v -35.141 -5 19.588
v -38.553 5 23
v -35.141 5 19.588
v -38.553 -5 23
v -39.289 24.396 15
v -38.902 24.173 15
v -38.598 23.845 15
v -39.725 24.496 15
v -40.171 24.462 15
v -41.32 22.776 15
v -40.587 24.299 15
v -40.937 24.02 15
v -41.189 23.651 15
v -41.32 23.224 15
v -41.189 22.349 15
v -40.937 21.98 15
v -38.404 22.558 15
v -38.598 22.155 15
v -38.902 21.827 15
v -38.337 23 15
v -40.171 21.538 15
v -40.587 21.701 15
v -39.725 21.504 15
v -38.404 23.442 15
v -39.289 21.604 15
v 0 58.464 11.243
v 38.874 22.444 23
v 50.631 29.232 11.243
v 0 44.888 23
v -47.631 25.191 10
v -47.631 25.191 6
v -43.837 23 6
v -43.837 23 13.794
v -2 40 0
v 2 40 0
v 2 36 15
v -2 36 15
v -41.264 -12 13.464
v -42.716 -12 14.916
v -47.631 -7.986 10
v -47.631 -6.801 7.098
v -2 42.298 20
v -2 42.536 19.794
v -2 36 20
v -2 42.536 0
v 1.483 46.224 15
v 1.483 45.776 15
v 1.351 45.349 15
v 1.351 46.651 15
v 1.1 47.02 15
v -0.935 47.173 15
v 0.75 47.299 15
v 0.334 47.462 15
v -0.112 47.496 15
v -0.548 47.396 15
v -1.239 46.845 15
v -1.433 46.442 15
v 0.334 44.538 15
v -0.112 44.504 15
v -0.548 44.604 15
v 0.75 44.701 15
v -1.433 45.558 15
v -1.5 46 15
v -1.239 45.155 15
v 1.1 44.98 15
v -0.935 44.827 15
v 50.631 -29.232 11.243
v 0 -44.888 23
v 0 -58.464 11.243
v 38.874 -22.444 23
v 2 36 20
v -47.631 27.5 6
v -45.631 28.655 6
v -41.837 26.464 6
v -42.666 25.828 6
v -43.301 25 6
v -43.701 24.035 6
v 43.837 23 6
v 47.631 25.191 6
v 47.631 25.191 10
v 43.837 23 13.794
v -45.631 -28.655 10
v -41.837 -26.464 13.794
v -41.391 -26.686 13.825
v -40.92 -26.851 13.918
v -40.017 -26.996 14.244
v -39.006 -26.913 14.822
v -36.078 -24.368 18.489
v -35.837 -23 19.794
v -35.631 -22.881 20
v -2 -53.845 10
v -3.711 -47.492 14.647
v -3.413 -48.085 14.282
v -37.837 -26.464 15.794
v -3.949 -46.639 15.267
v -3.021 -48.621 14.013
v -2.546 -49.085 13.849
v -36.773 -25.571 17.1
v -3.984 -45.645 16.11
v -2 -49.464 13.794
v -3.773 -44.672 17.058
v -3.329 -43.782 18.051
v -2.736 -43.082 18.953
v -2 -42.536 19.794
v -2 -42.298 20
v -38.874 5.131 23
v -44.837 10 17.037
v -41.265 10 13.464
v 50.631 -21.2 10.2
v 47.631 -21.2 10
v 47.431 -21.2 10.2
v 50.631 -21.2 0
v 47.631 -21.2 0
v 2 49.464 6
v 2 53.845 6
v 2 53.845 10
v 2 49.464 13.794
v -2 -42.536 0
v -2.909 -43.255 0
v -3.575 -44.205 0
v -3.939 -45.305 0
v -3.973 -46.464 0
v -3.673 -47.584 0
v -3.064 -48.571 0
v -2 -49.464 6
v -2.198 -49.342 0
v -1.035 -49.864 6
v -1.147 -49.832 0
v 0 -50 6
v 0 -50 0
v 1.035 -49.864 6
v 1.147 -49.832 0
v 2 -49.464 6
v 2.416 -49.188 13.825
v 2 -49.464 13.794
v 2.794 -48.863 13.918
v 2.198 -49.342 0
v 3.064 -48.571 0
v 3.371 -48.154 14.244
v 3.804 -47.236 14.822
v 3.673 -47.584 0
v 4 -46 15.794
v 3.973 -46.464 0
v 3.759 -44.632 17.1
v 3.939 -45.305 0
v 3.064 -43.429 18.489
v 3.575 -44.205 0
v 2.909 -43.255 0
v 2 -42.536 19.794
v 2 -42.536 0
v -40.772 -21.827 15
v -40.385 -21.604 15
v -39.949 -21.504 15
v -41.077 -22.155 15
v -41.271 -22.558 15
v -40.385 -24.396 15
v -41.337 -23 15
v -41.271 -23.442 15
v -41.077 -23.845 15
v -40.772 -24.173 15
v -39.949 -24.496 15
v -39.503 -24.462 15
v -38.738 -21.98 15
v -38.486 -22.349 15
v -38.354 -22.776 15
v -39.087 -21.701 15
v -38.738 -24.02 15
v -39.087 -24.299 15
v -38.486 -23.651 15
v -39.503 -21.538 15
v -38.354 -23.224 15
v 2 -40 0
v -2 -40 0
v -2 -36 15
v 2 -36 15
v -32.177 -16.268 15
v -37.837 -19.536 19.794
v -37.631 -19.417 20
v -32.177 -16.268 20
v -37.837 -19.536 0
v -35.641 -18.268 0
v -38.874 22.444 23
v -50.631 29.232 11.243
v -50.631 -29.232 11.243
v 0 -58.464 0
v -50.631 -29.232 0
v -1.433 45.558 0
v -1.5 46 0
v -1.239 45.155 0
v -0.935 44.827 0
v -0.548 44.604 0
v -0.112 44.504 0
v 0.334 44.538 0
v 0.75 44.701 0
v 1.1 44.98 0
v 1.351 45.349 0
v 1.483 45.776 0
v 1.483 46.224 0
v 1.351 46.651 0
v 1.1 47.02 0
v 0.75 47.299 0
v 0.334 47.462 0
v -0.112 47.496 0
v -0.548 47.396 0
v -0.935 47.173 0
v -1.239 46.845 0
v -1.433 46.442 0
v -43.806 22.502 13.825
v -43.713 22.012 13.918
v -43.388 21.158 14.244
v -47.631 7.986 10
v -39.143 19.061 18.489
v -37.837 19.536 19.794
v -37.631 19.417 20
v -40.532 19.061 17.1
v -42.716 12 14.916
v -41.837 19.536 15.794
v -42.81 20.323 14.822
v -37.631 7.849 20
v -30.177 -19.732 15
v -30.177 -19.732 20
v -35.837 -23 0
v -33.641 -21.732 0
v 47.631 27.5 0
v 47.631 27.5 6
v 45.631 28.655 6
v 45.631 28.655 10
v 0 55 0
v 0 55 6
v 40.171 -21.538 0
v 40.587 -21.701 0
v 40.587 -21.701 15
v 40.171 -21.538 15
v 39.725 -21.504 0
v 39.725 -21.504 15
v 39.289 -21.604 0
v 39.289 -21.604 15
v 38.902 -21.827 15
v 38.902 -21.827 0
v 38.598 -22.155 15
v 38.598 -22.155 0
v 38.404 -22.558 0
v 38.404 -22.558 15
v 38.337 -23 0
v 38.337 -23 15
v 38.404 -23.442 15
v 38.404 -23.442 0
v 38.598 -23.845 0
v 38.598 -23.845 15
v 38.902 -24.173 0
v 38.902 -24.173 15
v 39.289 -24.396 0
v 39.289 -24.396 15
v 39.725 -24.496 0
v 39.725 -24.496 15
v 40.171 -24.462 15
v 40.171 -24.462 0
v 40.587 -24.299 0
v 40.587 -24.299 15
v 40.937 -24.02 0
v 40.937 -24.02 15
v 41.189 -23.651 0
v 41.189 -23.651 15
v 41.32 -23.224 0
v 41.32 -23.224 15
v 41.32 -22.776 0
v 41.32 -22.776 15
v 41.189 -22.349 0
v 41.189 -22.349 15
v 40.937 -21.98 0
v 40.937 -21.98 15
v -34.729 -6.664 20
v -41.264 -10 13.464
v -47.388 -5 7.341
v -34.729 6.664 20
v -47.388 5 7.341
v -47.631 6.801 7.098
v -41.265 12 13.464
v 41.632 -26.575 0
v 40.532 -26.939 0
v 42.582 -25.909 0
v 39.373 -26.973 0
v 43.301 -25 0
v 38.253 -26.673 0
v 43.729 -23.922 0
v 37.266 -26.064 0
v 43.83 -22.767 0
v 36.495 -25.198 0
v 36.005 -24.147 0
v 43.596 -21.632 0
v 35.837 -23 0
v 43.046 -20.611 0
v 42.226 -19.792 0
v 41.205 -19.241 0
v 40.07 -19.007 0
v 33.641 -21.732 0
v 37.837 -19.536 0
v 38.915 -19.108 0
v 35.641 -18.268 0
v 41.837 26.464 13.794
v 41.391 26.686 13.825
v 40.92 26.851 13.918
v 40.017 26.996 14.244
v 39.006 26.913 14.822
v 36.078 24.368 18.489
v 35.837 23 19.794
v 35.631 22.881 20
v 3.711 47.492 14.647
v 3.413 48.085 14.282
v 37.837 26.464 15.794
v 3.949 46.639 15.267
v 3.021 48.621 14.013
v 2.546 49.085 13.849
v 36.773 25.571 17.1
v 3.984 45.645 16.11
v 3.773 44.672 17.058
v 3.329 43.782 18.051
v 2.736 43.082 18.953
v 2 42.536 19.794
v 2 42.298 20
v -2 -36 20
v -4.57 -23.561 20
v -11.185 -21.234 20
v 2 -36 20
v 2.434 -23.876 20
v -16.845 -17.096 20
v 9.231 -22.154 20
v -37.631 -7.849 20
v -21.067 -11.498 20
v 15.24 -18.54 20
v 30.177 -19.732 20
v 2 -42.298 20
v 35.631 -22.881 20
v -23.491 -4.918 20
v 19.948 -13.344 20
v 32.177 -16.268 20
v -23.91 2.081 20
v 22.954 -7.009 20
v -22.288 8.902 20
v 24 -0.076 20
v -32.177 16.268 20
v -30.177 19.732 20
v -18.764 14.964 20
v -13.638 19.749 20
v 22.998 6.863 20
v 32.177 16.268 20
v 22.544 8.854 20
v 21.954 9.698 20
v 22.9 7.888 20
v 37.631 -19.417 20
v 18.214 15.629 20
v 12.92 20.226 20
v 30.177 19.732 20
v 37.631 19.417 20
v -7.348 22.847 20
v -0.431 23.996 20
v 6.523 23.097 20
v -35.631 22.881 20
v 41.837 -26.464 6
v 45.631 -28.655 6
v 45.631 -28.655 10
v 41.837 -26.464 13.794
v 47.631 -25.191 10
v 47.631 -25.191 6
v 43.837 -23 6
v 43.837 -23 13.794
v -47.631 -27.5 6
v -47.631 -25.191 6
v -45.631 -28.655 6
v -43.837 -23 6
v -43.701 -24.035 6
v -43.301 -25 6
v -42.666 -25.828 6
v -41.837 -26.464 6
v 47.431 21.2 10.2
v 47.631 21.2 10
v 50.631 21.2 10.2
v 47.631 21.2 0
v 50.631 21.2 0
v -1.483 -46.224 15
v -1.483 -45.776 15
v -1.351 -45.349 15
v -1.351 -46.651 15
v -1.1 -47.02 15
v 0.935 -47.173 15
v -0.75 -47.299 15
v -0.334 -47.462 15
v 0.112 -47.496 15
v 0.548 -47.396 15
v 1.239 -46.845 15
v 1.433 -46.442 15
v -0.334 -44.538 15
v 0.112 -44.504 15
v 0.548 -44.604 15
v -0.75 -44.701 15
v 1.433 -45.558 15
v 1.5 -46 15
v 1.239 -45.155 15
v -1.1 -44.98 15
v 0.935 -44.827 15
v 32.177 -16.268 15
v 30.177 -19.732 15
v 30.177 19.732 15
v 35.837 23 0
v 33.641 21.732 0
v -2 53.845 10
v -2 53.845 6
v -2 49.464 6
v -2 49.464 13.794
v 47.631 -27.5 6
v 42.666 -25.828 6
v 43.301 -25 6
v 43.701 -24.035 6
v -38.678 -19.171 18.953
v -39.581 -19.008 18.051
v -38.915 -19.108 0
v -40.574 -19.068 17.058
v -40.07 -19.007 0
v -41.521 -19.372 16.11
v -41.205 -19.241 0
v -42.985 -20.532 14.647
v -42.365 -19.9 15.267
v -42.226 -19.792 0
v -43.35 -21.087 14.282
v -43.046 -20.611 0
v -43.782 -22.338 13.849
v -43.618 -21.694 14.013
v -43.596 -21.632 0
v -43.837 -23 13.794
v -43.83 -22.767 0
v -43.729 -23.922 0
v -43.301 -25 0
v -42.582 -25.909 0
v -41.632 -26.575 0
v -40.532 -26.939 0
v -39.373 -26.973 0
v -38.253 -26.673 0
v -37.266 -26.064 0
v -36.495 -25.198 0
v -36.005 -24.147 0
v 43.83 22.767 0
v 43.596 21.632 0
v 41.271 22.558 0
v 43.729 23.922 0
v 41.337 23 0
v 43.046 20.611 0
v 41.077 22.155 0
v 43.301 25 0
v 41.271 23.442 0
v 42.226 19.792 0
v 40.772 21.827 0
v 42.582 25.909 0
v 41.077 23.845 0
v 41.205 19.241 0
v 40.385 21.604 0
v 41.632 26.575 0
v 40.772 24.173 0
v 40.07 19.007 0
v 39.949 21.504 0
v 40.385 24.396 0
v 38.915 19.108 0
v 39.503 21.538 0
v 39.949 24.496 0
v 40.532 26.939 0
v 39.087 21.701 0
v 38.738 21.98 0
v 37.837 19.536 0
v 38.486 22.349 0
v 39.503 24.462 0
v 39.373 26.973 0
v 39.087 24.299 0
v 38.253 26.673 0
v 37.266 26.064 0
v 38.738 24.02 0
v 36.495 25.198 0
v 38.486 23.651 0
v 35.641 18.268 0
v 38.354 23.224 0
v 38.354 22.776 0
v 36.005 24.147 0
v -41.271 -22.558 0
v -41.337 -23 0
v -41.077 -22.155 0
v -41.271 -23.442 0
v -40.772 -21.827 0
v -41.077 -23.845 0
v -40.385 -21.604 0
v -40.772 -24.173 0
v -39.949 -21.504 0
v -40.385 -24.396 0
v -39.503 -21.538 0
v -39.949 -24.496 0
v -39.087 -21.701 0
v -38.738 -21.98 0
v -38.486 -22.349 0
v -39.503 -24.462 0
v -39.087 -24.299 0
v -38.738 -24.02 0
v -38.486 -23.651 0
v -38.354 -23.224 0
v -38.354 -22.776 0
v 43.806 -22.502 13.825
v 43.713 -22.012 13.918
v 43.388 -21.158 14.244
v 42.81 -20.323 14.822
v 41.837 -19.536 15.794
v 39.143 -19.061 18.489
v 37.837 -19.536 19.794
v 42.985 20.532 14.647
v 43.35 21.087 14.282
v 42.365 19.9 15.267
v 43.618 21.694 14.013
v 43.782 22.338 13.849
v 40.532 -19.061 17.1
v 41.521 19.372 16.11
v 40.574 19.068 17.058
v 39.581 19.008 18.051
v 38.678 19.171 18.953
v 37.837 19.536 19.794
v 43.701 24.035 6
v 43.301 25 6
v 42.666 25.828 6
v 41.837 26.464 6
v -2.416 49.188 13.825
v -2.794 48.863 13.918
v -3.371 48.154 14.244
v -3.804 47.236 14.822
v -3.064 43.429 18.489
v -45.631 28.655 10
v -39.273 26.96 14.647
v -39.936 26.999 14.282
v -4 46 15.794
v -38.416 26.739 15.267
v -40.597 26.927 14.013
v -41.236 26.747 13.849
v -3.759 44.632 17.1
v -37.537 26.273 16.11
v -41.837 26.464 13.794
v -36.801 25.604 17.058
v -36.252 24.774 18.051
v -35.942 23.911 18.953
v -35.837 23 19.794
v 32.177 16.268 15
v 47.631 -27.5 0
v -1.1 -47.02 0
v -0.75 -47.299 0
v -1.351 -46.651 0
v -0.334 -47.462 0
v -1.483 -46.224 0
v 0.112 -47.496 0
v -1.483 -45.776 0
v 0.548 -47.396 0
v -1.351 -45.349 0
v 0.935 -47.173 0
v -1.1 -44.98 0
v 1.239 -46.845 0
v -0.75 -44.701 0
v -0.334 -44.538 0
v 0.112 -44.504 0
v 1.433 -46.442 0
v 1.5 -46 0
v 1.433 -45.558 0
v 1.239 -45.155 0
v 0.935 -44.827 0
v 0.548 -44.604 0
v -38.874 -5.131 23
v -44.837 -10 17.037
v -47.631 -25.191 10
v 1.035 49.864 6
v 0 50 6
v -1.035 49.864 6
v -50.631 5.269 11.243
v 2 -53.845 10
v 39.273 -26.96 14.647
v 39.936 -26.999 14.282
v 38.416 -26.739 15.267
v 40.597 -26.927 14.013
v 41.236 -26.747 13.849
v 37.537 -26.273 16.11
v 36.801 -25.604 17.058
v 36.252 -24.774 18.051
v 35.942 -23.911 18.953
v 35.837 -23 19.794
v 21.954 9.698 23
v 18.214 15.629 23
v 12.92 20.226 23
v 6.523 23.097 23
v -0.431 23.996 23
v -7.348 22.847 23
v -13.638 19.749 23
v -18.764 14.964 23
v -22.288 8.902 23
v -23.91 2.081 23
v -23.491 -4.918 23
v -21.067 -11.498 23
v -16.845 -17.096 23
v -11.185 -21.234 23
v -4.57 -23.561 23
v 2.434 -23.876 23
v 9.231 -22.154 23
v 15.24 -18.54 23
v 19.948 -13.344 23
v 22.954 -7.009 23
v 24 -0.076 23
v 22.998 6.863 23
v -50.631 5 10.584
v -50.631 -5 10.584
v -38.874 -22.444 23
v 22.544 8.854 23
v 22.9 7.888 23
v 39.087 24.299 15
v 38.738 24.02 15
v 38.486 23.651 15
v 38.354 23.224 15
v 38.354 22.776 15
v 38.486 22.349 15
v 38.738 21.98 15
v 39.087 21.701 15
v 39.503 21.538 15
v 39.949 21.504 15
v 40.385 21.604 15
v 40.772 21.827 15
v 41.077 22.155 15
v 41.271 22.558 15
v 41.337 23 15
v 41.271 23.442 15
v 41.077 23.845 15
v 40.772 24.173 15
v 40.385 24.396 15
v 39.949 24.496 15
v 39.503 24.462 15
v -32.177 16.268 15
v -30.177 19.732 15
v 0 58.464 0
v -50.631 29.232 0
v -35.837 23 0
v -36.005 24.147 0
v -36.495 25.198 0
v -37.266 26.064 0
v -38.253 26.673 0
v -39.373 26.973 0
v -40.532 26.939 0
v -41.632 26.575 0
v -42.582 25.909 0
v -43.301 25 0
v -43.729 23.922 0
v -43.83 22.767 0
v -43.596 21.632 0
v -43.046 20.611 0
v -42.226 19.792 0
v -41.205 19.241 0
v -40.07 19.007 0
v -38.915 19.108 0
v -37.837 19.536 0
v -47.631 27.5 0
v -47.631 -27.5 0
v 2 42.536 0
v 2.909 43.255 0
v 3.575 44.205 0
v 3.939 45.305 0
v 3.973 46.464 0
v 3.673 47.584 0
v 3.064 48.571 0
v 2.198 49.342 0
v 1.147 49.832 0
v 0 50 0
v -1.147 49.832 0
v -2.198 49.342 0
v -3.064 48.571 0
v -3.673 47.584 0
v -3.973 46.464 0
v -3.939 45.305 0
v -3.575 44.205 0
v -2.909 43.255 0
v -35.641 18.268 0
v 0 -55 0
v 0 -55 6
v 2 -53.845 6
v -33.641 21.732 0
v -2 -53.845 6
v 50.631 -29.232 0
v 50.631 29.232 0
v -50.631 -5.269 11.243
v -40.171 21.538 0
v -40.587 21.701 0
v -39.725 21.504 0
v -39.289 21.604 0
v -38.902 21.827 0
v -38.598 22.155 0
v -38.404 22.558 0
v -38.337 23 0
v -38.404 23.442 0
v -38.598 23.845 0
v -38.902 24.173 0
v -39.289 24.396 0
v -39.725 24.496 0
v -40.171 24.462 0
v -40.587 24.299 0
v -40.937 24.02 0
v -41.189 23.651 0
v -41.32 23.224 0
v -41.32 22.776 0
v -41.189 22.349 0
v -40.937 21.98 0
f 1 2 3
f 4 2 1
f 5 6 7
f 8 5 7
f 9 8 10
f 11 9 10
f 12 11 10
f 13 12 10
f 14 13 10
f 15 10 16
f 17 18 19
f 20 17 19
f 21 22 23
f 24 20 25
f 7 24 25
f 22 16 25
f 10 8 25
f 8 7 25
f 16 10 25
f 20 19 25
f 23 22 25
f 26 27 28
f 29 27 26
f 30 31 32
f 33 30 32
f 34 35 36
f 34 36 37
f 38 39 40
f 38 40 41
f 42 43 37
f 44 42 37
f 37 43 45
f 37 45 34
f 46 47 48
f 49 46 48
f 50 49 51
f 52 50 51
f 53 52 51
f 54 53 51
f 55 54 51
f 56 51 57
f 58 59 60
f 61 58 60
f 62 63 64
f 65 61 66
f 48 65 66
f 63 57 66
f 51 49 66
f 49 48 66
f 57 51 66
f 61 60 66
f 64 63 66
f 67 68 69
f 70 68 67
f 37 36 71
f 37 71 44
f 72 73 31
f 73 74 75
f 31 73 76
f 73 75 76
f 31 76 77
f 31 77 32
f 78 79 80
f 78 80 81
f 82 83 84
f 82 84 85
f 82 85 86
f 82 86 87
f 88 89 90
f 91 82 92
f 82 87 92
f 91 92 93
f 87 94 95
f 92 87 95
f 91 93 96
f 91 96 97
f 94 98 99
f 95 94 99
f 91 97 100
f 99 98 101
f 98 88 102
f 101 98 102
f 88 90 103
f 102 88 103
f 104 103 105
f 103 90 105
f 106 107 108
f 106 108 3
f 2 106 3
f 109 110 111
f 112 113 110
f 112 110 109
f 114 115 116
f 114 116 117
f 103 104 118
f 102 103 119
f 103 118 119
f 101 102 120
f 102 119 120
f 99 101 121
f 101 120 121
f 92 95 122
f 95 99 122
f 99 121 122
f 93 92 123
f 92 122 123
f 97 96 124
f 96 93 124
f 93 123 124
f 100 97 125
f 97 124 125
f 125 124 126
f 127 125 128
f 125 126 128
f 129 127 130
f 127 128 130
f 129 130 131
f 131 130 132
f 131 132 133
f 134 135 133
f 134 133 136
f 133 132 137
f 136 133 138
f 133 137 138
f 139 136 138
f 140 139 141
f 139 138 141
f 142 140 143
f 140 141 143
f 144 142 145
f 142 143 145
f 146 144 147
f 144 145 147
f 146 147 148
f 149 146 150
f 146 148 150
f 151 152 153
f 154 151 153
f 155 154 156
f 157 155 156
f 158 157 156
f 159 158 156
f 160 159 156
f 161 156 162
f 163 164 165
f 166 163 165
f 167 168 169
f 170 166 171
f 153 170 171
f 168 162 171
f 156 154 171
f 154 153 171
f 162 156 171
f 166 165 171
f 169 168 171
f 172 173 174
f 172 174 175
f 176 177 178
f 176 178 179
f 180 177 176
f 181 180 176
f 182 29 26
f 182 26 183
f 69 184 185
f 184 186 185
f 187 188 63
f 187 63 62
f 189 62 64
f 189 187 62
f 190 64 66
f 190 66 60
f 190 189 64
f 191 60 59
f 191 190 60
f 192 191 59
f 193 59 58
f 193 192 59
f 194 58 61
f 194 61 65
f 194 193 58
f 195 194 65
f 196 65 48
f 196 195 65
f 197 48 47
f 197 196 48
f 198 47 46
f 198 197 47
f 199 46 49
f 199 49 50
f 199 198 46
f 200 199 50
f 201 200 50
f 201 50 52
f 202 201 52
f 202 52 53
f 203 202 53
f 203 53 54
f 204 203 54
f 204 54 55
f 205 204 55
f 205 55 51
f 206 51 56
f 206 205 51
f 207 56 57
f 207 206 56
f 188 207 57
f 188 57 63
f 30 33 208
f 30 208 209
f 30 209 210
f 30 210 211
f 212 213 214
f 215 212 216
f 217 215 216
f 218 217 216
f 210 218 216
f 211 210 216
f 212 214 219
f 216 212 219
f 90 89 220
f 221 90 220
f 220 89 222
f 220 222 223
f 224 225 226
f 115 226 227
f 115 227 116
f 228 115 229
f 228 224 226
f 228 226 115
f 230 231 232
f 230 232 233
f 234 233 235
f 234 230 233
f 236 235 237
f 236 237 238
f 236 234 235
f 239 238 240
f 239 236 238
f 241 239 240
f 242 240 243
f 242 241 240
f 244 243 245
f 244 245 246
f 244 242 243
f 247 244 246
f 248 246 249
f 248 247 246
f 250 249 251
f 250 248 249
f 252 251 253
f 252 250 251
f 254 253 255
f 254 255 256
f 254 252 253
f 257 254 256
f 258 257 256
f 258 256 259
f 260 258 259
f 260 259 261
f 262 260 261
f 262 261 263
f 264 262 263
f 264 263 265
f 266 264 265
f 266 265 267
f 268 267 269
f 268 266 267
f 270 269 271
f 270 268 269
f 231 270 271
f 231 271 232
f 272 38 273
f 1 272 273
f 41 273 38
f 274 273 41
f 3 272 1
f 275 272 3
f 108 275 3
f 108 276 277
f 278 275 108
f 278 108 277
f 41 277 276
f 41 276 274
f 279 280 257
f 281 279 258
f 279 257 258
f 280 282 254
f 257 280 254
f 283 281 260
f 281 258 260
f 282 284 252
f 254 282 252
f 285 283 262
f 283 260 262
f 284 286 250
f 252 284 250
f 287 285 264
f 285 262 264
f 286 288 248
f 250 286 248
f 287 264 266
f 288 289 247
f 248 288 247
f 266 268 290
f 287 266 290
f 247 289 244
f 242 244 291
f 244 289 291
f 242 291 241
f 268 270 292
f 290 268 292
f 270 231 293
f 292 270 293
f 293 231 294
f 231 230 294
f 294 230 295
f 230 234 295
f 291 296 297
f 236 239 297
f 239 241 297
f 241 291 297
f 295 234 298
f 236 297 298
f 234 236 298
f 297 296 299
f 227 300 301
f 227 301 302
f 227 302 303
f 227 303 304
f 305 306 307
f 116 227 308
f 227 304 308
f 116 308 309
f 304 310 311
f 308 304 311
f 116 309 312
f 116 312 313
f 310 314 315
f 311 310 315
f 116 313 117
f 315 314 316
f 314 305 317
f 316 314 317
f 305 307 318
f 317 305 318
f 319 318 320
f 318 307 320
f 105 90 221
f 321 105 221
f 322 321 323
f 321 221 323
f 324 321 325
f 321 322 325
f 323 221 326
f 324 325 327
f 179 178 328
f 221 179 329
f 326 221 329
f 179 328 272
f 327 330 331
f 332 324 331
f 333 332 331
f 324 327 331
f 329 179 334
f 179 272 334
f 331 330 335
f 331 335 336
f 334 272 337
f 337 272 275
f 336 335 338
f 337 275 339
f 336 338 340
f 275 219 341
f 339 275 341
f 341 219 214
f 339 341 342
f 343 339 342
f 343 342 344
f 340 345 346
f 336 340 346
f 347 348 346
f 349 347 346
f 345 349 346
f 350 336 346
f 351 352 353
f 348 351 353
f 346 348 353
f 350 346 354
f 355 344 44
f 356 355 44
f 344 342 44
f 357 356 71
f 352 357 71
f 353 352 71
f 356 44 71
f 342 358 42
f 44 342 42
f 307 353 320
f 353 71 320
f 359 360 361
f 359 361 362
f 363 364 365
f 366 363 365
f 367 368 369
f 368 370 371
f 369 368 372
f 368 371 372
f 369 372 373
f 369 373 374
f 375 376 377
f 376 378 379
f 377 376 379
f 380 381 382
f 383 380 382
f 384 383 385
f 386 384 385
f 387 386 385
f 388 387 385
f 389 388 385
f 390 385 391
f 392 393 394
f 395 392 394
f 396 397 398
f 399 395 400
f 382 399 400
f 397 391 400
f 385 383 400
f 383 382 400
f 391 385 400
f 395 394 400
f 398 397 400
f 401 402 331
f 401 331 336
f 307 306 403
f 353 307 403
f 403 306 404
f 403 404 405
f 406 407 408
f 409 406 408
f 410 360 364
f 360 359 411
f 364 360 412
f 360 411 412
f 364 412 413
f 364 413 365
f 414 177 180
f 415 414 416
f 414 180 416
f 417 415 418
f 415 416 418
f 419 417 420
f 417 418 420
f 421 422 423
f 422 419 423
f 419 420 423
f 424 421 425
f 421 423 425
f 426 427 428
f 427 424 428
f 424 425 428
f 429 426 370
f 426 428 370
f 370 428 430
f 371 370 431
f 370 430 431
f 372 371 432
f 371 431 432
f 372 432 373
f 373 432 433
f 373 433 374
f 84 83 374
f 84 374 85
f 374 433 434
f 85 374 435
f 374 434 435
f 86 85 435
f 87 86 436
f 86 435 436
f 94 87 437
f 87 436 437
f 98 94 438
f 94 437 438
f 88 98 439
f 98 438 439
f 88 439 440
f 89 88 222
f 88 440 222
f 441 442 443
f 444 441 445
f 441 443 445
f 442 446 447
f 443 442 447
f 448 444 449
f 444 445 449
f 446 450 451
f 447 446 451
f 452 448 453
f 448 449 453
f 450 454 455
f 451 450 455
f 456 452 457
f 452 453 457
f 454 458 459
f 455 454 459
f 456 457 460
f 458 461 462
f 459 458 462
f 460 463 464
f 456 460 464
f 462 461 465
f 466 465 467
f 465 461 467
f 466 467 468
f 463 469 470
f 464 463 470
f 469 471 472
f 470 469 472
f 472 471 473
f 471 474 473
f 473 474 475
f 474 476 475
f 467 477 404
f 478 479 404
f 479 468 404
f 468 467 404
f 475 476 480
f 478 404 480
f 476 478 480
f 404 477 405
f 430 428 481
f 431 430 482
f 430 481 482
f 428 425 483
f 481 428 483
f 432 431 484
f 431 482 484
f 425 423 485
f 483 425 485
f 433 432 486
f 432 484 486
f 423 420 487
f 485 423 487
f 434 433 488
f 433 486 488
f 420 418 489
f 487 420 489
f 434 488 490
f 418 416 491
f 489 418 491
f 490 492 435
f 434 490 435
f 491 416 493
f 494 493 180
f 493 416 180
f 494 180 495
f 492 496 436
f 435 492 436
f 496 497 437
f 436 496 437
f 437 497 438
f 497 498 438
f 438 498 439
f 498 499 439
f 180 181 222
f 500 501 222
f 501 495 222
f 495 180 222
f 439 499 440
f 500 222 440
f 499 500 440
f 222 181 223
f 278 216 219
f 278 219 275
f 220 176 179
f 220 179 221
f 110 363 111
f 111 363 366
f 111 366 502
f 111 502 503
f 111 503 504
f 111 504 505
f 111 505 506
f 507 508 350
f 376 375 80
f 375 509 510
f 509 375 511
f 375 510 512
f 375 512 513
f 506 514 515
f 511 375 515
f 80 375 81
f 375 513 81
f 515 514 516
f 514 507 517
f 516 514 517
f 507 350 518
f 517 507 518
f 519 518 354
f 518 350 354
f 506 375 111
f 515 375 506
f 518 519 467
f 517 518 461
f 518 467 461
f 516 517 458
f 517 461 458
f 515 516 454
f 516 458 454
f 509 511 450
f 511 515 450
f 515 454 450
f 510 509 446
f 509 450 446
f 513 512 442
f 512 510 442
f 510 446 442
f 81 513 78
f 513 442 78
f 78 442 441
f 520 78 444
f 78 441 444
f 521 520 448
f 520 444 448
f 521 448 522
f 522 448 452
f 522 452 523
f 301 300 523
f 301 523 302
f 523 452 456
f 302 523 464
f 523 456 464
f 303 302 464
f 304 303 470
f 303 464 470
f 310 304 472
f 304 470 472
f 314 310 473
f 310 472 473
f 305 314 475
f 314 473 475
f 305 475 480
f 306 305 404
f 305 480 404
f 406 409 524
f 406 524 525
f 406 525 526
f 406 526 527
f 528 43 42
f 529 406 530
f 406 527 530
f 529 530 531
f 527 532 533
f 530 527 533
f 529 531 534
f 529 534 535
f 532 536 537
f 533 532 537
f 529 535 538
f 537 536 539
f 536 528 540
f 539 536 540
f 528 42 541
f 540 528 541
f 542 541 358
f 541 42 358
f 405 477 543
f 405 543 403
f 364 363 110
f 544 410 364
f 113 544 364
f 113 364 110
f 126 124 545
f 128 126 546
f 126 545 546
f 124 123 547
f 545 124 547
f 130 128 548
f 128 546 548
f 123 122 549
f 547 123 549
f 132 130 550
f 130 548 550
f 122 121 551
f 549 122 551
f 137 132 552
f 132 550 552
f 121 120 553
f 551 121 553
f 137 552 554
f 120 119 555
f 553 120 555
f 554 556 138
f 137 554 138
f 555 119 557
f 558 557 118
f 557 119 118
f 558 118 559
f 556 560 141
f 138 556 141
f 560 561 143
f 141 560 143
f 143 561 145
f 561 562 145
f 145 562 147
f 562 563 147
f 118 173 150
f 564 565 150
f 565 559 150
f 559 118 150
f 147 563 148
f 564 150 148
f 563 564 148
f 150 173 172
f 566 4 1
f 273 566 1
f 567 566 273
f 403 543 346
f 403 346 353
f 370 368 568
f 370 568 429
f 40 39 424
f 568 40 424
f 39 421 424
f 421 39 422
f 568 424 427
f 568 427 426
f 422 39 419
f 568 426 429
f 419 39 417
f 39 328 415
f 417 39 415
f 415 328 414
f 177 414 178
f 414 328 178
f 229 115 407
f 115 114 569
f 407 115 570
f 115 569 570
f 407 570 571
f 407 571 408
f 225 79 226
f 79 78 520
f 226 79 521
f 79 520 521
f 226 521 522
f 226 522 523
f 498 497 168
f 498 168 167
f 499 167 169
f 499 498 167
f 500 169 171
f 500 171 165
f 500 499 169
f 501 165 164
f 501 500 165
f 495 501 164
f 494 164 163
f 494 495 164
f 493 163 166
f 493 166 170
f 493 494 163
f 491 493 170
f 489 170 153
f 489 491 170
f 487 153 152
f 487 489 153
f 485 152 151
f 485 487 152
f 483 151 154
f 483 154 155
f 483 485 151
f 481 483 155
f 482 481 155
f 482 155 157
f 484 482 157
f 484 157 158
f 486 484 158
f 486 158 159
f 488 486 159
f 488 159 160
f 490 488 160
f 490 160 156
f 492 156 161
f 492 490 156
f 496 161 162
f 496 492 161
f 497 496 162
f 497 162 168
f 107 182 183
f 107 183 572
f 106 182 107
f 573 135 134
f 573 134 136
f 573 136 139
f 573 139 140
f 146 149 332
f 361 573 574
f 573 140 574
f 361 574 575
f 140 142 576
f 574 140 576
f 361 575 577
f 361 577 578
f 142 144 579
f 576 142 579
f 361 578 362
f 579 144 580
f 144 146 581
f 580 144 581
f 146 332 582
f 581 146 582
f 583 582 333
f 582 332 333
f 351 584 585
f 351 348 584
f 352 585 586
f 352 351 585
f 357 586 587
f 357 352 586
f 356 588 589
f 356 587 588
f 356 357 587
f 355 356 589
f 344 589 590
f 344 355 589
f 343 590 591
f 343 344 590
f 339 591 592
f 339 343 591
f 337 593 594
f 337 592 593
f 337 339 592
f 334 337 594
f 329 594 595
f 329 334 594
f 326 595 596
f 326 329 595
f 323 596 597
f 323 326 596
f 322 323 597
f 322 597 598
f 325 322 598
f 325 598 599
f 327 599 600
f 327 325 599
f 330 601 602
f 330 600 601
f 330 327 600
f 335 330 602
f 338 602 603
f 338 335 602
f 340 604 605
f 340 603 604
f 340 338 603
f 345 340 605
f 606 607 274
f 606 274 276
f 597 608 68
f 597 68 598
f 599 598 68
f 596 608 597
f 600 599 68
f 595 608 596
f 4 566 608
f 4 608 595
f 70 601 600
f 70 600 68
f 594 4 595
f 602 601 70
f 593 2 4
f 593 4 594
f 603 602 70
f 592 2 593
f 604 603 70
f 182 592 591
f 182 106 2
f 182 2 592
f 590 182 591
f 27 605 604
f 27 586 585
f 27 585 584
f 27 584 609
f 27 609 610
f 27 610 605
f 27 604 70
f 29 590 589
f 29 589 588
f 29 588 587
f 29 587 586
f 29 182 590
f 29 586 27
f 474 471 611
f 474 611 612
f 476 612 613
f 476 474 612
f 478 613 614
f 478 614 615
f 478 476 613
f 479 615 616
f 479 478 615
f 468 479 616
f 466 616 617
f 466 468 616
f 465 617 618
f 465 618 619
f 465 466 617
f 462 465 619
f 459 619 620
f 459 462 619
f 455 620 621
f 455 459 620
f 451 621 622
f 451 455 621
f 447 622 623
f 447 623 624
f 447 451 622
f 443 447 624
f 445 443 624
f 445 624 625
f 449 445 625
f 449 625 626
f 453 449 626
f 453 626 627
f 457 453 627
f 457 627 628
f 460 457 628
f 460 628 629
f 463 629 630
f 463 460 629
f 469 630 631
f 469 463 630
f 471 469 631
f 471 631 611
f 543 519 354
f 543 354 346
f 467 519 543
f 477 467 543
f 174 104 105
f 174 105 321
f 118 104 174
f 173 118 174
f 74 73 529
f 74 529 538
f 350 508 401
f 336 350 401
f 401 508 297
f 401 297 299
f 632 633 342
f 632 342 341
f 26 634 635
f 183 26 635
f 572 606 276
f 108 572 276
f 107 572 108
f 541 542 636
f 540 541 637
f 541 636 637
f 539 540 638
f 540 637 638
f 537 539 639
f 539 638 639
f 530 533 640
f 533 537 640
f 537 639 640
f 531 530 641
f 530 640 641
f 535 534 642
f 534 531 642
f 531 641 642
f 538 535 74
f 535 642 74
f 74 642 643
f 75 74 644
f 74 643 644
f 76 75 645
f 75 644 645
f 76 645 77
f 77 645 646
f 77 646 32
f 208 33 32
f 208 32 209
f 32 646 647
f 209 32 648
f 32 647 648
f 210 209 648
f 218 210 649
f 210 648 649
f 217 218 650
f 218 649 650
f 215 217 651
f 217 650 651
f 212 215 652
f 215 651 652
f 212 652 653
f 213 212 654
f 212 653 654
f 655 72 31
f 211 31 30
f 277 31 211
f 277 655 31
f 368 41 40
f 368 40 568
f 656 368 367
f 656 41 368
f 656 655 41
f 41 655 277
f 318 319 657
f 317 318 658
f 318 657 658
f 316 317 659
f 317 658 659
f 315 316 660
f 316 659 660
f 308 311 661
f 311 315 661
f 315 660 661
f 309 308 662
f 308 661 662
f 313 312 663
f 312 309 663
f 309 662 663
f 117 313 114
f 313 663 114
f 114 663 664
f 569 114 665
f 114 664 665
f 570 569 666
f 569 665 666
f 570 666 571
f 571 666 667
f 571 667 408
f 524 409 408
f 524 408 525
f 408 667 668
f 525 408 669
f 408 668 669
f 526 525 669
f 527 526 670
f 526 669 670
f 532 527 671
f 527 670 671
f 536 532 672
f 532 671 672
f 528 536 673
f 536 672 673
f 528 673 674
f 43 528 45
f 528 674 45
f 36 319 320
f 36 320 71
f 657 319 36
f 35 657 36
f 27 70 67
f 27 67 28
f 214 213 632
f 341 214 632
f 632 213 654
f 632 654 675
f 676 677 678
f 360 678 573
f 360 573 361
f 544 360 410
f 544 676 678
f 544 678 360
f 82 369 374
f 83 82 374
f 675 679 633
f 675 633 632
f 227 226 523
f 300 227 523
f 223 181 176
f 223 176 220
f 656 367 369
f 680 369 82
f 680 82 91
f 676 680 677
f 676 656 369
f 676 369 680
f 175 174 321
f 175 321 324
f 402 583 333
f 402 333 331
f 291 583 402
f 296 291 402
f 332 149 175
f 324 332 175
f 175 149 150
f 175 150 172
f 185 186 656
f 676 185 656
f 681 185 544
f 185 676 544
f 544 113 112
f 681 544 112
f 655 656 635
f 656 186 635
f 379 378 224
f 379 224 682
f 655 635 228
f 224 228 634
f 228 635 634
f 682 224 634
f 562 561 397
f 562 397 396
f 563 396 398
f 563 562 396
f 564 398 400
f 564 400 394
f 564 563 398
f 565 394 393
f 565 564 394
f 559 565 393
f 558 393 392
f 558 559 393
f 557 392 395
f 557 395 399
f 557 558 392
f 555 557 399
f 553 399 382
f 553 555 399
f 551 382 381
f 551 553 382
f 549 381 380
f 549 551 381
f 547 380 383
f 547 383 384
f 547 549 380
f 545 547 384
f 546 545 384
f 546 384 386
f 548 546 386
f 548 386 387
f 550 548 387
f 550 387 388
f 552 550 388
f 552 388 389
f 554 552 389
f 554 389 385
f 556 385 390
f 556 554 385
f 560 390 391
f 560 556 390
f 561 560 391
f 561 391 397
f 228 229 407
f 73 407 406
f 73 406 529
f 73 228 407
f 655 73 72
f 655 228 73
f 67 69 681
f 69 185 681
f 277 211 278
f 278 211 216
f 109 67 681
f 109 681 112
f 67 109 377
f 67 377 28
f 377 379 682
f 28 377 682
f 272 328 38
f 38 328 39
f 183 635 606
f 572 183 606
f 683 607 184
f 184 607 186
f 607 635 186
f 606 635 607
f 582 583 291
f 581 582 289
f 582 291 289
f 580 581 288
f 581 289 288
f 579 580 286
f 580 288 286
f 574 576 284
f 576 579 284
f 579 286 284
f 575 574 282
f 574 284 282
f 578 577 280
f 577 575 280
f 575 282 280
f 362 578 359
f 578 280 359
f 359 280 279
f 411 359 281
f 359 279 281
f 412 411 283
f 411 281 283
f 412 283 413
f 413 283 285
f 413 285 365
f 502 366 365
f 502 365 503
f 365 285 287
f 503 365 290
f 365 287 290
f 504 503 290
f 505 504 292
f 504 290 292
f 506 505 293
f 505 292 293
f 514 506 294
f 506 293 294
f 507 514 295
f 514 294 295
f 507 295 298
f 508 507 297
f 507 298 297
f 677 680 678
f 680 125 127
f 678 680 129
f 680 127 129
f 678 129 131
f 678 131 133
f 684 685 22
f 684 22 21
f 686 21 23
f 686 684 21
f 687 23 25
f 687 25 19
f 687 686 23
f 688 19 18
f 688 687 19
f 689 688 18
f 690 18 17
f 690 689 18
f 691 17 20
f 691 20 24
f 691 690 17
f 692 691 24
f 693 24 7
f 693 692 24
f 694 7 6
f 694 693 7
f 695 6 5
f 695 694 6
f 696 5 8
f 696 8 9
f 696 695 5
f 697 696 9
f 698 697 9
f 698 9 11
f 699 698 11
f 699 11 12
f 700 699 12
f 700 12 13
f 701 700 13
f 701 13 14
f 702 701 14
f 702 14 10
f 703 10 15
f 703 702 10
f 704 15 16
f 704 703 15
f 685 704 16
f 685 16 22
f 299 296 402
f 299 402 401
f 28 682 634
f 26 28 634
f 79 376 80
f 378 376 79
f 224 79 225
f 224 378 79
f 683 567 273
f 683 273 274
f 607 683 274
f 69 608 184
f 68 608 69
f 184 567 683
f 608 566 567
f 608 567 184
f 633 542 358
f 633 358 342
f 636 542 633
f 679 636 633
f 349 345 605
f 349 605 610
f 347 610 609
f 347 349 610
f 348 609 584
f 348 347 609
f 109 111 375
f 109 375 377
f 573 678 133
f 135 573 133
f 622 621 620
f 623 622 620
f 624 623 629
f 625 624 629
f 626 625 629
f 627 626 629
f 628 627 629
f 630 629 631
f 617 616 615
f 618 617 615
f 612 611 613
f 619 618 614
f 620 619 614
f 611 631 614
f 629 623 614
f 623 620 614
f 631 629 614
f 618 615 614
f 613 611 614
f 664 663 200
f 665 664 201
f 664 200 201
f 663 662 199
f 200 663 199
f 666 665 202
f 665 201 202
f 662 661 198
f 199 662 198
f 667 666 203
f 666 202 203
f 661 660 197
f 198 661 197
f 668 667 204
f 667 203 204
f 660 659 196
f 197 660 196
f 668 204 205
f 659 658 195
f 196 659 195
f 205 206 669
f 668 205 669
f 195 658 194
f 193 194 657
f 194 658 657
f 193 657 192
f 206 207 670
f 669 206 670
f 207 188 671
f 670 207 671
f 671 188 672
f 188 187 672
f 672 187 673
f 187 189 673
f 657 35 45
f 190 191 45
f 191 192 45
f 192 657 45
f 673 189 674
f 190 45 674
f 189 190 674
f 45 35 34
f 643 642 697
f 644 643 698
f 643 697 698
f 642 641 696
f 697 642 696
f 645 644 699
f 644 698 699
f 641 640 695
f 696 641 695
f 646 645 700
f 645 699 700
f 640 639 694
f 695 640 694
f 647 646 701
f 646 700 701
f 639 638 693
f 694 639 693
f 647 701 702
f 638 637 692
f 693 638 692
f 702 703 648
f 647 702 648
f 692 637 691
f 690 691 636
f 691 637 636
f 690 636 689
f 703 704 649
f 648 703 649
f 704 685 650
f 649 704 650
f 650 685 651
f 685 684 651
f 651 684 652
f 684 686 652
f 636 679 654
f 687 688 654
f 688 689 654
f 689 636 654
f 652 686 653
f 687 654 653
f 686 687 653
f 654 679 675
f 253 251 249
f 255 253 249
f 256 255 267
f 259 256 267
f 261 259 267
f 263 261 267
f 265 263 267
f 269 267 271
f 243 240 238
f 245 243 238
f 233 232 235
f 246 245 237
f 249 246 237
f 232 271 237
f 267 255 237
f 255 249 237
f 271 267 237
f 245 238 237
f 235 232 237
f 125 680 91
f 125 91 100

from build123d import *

# Parameters (mm, degrees)
PRISM005_DEPTH           = 23
PRISM005_ROLL_ANGLE      = 153.435058
PRISM005_PITCH_ANGLE     = 37.760957
PRISM005_PLACEMENT_ANGLE = 140.768627
PRISM006_DEPTH           = 5
PRISM006_ROLL_ANGLE      = 153.435058
PRISM006_PITCH_ANGLE     = 37.760957
PRISM006_PLACEMENT_ANGLE = 140.768627
CHAMFER005_SIZE          = 4
BOX013_W                 = 6
BOX013_H                 = 42.4
BOX013_DEPTH             = 10.2
CYLINDER004_R            = 2
CYLINDER004_DEPTH        = 42
CYLINDER004_ROLL_ANGLE   = 90
PAD004_DEPTH             = 37
BODY004_PITCH_ANGLE      = -45
CYLINDER001_R            = 4
CYLINDER001_DEPTH        = 44
CYLINDER002_R            = 24
CYLINDER002_DEPTH        = 44
PAD003_DEPTH             = 5.62
PRISM_DEPTH              = 20
PRISM_PLACEMENT_ANGLE    = 30
CHAMFER001_SIZE          = 10
THICKNESS_T              = 3
CYLINDER047_R            = 1.5
CYLINDER047_DEPTH        = 15
BOX030_W                 = 4
BOX030_H                 = 7
BOX030_DEPTH             = 22
CHAMFER003_SIZE2         = 4
CHAMFER003_SIZE          = 15
BOX029_W                 = 12
BOX029_H                 = 10
BOX029_DEPTH             = 14
BOX029_ROLL_ANGLE        = -45
CYLINDER046_R            = 4
CYLINDER046_DEPTH        = 21
BOX031_W                 = 4
BOX031_H                 = 7
BOX031_DEPTH             = 10
CHAMFER004_SIZE          = 5
ARRAY001_COUNT           = 6


with BuildPart() as agujero_hexagonal_boton:
    # Prism005 → Prism005 (new body)
    with BuildSketch(Plane.XY):
        Polygon((10, 0), (5, 8.660254), (-5, 8.660254), (-10, 0), (-5, -8.660254), (5, -8.660254), align=None)
    extrude(amount=PRISM005_DEPTH)


with BuildPart() as agujero_hexagonal_boton_1:
    # Prism005 roll: moved
    add(agujero_hexagonal_boton.part.rotate(Axis((0, 0, 0), (1, 0, 0)), PRISM005_ROLL_ANGLE))


with BuildPart() as agujero_hexagonal_boton_2:
    # Prism005 pitch: moved
    add(agujero_hexagonal_boton_1.part.rotate(Axis((0, 0, 0), (0, 1, 0)), PRISM005_PITCH_ANGLE))


with BuildPart() as agujero_hexagonal_boton_3:
    # Prism005 placement: moved
    add(agujero_hexagonal_boton_2.part.moved(Location((-45.8, 0, 18))).rotate(Axis((-45.8, 0, 18), (0, 0, 1)), PRISM005_PLACEMENT_ANGLE))


with BuildPart() as borde_hexagonal_agujero:
    # Prism006 → Prism006 (new body)
    with BuildSketch(Plane.XY):
        Polygon((12, 0), (6, 10.392305), (-6, 10.392305), (-12, 0), (-6, -10.392305), (6, -10.392305), align=None)
    extrude(amount=PRISM006_DEPTH)


with BuildPart() as borde_hexagonal_agujero_1:
    # Prism006 roll: moved
    add(borde_hexagonal_agujero.part.rotate(Axis((0, 0, 0), (1, 0, 0)), PRISM006_ROLL_ANGLE))


with BuildPart() as borde_hexagonal_agujero_2:
    # Prism006 pitch: moved
    add(borde_hexagonal_agujero_1.part.rotate(Axis((0, 0, 0), (0, 1, 0)), PRISM006_PITCH_ANGLE))


with BuildPart() as borde_hexagonal_agujero_3:
    # Prism006 placement: moved
    add(borde_hexagonal_agujero_2.part.moved(Location((-44.8, 0, 17))).rotate(Axis((-44.8, 0, 17), (0, 0, 1)), PRISM006_PLACEMENT_ANGLE))

    # Chamfer005
    chamfer005_edges = [borde_hexagonal_agujero_3.edges().sort_by_distance(p)[0] for p in [
        (-37.451495, -4e-06, 24.348434),
        (-52.148505, 4e-06, 9.651566),
    ]]
    chamfer(chamfer005_edges, length=CHAMFER005_SIZE)


with BuildPart() as cubo010:
    # Box013 → Box013 (new body)
    with BuildSketch(Plane(origin=(44.7, -21.2, 0), x_dir=(1, 0, 0), z_dir=(0, 0, 1))):
        with Locations((3, 21.2)):
            Rectangle(BOX013_W, BOX013_H)
    extrude(amount=BOX013_DEPTH)


with BuildPart() as bisagra_eliminado:
    # Cylinder004 → Cylinder004 (new body)
    with BuildSketch(Plane.XY):
        Circle(CYLINDER004_R)
    extrude(amount=CYLINDER004_DEPTH)


with BuildPart() as bisagra_eliminado_1:
    # Cylinder004 roll: moved
    add(bisagra_eliminado.part.rotate(Axis((0, 0, 0), (1, 0, 0)), CYLINDER004_ROLL_ANGLE))


with BuildPart() as bisagra_eliminado_2:
    # Cylinder004 placement: moved
    add(bisagra_eliminado_1.part.moved(Location((-39, 21, 33))))


with BuildPart() as recorte_boton_viejo_eliminado:
    # Sketch004 → Pad004 (new body)
    with BuildSketch(Plane.XY):
        Polygon((-40.876069, 10), (-49.536323, 5), (-49.536323, -5), (-40.876069, -10), (-32.215815, -5), (-32.215815, 5), align=None)
    extrude(amount=PAD004_DEPTH)


with BuildPart() as recorte_boton_viejo_eliminado_1:
    # Body004 pitch: moved
    add(recorte_boton_viejo_eliminado.part.rotate(Axis((0, 0, 0), (0, 1, 0)), BODY004_PITCH_ANGLE))


with BuildPart() as recorte_boton_viejo_eliminado_2:
    # Body004 placement: moved
    add(recorte_boton_viejo_eliminado_1.part.moved(Location((0, 0, 103))))


with BuildPart() as agujero_led_builtin:
    # Cylinder001 → Cylinder001 (new body)
    with BuildSketch(Plane(origin=(19, 7, 0), x_dir=(1, 0, 0), z_dir=(0, 0, 1))):
        Circle(CYLINDER001_R)
    extrude(amount=CYLINDER001_DEPTH)


with BuildPart() as fusion002:
    # Cylinder002 → Cylinder002 (new body)
    with BuildSketch(Plane.XY):
        Circle(CYLINDER002_R)
    extrude(amount=CYLINDER002_DEPTH)

    # Fusion002: union agujero led builtin
    add(agujero_led_builtin.part)


with BuildPart() as agujero_microusb:
    # Sketch003 → Pad003 (new body)
    with BuildSketch(Plane.YZ):
        Polygon((-3, 0.536587), (3, 0.536587), (4.5, -3.263413), (-4.5, -3.263413), align=None)
    extrude(amount=PAD003_DEPTH)


with BuildPart() as agujero_microusb_1:
    # Body003 placement: moved
    add(agujero_microusb.part.moved(Location((45.85, 0, 5))))


with BuildPart() as tapa_superior_con_agujero_hexagonal:
    # Prism → Prism (new body)
    with BuildSketch(Plane.XY):
        Polygon((55, 0), (27.5, 47.631397), (-27.5, 47.631397), (-55, 0), (-27.5, -47.631397), (27.5, -47.631397), align=None)
    extrude(amount=PRISM_DEPTH)


with BuildPart() as tapa_superior_con_agujero_hexagonal_1:
    # Prism placement: moved
    add(tapa_superior_con_agujero_hexagonal.part.rotate(Axis((0, 0, 0), (0, 0, 1)), PRISM_PLACEMENT_ANGLE))

    # Chamfer001
    chamfer001_edges = [tapa_superior_con_agujero_hexagonal_1.edges().sort_by_distance(p)[0] for p in [
        (23.815699, 41.25, 20),
        (-23.815699, 41.25, 20),
        (-47.631397, 0, 20),
        (-23.815699, -41.25, 20),
        (23.815699, -41.25, 20),
        (47.631397, 0, 20),
    ]]
    chamfer(chamfer001_edges, length=CHAMFER001_SIZE)

    # Thickness
    thickness_openings = [tapa_superior_con_agujero_hexagonal_1.faces().sort_by_distance(p)[0] for p in [
        (0, 0, 0),
    ]]
    offset(amount=THICKNESS_T, openings=thickness_openings, kind=Kind.INTERSECTION)

    # Cut001: cut agujero microusb
    add(agujero_microusb_1.part, mode=Mode.SUBTRACT)

    # Cut002: cut Fusion002
    add(fusion002.part, mode=Mode.SUBTRACT)

    # Cut004: cut recorte boton viejo (eliminado)
    add(recorte_boton_viejo_eliminado_2.part, mode=Mode.SUBTRACT)

    # Cut005: cut bisagra (eliminado)
    add(bisagra_eliminado_2.part, mode=Mode.SUBTRACT)

    # Cut009: cut Cubo010
    add(cubo010.part, mode=Mode.SUBTRACT)

    # Fusion011: union borde hexagonal agujero
    add(borde_hexagonal_agujero_3.part)

    # Cut016: cut agujero hexagonal boton
    add(agujero_hexagonal_boton_3.part, mode=Mode.SUBTRACT)


with BuildPart() as cilindro023:
    # Cylinder047 → Cylinder047 (new body)
    with BuildSketch(Plane(origin=(0, -46, 0), x_dir=(1, 0, 0), z_dir=(0, 0, 1))):
        Circle(CYLINDER047_R)
    extrude(amount=CYLINDER047_DEPTH)


with BuildPart() as chamfer003:
    # Box030 → Box030 (new body)
    with BuildSketch(Plane(origin=(-2, -43, 0), x_dir=(1, 0, 0), z_dir=(0, 0, 1))):
        with Locations((2, 3.5)):
            Rectangle(BOX030_W, BOX030_H)
    extrude(amount=BOX030_DEPTH)

    # Chamfer003
    chamfer003_edges = [chamfer003.edges().sort_by_distance(p)[0] for p in [
        (0, -36, 0),
    ]]
    chamfer003_side = chamfer003.faces().sort_by_distance((0, -36, 11))[0]
    chamfer(chamfer003_edges, length=CHAMFER003_SIZE, length2=CHAMFER003_SIZE2, reference=chamfer003_side)


with BuildPart() as cubo025:
    # Box029 → Box029 (new body)
    with BuildSketch(Plane.XY):
        with Locations((6, 5)):
            Rectangle(BOX029_W, BOX029_H)
    extrude(amount=BOX029_DEPTH)


with BuildPart() as cubo025_1:
    # Box029 roll: moved
    add(cubo025.part.rotate(Axis((0, 0, 0), (1, 0, 0)), BOX029_ROLL_ANGLE))


with BuildPart() as cubo025_2:
    # Box029 placement: moved
    add(cubo025_1.part.moved(Location((-7, -59, 20))))


with BuildPart() as cut014:
    # Cylinder046 → Cylinder046 (new body)
    with BuildSketch(Plane(origin=(0, -46, 0), x_dir=(1, 0, 0), z_dir=(0, 0, 1))):
        Circle(CYLINDER046_R)
    extrude(amount=CYLINDER046_DEPTH)

    # Cut014: cut Cubo025
    add(cubo025_2.part, mode=Mode.SUBTRACT)


with BuildPart() as tapa_superior:
    # Box031 → Box031 (new body)
    with BuildSketch(Plane(origin=(-2, -56, 6), x_dir=(1, 0, 0), z_dir=(0, 0, 1))):
        with Locations((2, 3.5)):
            Rectangle(BOX031_W, BOX031_H)
    extrude(amount=BOX031_DEPTH)

    # Chamfer004
    chamfer004_edges = [tapa_superior.edges().sort_by_distance(p)[0] for p in [
        (0, -56, 16),
    ]]
    chamfer(chamfer004_edges, length=CHAMFER004_SIZE)

    # Fusion010: union Chamfer003, Cut014
    add(chamfer003.part)
    add(cut014.part)

    # Cut015: cut Cilindro023
    add(cilindro023.part, mode=Mode.SUBTRACT)

    # Array001: tapa superior ×6 about axis
    array001_axis = Axis((0, 0, 0), (0, 0, 1))


with BuildPart() as tapa_superior_1:
    add(tapa_superior.part)
    for i in range(1, ARRAY001_COUNT):
        add(tapa_superior.part.rotate(array001_axis, i * 360 / ARRAY001_COUNT))

    # Fusion012: union tapa superior con agujero hexagonal
    add(tapa_superior_con_agujero_hexagonal_1.part)


solid = tapa_superior_1.part
